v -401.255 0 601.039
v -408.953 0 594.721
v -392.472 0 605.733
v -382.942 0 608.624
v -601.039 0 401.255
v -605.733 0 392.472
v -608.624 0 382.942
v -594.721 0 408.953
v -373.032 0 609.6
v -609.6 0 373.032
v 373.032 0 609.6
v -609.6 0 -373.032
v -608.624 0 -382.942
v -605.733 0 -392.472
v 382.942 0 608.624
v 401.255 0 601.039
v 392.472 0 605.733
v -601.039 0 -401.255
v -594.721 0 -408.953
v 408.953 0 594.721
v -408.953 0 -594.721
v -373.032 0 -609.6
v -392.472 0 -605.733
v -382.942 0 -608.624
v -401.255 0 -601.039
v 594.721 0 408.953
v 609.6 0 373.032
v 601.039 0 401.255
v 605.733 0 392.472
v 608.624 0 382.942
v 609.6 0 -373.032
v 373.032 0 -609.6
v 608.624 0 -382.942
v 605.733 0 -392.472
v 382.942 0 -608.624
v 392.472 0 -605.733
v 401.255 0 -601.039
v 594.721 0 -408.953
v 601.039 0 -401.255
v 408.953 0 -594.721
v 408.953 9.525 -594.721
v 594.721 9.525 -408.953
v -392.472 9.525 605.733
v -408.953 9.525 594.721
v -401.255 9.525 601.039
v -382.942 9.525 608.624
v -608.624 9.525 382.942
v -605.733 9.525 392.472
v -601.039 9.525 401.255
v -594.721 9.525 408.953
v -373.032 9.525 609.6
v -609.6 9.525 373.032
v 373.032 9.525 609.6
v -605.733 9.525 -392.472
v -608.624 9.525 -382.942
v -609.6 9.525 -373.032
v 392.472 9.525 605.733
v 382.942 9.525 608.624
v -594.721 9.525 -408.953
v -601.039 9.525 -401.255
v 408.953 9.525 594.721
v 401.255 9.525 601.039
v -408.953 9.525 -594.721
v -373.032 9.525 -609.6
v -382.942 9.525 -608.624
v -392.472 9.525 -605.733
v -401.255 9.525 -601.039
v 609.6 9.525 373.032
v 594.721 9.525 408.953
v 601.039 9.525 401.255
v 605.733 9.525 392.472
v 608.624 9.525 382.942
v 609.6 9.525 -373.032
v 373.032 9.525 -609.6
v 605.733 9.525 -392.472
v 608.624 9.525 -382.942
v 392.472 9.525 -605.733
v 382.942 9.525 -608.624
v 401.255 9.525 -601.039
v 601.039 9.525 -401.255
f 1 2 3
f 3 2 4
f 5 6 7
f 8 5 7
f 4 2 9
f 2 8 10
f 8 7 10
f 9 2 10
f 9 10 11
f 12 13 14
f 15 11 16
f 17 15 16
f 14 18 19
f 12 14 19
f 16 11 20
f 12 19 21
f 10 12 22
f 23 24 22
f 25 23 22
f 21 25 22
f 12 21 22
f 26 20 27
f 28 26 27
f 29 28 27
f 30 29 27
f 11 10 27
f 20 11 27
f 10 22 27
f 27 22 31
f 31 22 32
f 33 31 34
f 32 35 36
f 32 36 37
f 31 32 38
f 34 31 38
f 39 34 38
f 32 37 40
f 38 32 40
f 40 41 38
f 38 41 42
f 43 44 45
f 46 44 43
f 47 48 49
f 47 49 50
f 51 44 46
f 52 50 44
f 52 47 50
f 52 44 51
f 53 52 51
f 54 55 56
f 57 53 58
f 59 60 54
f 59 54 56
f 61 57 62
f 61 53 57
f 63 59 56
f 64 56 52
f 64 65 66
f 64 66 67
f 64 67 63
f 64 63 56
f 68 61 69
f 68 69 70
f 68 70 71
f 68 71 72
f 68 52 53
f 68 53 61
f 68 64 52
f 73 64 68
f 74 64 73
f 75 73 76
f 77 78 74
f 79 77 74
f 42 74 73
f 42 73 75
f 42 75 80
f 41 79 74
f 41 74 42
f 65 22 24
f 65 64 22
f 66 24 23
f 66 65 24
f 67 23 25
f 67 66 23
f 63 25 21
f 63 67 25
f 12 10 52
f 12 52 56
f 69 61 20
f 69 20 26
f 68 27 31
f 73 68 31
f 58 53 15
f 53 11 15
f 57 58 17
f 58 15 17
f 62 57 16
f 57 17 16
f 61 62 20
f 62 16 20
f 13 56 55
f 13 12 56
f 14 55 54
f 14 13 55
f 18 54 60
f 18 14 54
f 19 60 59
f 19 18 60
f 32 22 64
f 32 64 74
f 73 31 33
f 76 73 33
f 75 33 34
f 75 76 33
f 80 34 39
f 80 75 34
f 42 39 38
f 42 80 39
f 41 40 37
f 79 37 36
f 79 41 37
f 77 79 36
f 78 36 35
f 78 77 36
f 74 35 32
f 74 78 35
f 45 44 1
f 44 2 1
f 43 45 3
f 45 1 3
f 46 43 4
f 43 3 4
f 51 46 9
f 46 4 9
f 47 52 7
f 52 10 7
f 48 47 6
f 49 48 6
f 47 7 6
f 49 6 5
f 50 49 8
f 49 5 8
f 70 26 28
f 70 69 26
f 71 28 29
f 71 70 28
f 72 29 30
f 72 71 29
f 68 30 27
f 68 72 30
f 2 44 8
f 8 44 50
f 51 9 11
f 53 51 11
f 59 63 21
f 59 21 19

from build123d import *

# Parameters (mm, degrees)
SKETCH1_W            = 1219.2
SKETCH1_H            = 1219.2
BOSS_EXTRUDE1_DEPTH  = 9.525
CUT_EXTRUDE1_REACH   = 864.157
SKETCH2_R            = 152.4
CUT_EXTRUDE2_DEPTH   = 863.157204705
MIRROR2_COPY_1_DEPTH = 863.157204705
FILLET1_R            = 50.8


with BuildPart() as part:
    # Sketch1 → Boss-Extrude1 (new body)
    with BuildSketch(Plane(origin=(0, 0, 0), x_dir=(1, 0, 0), z_dir=(0, 1, 0))):
        Rectangle(SKETCH1_W, SKETCH1_H)
    extrude(amount=BOSS_EXTRUDE1_DEPTH)

    # Sketch2 → Cut-Extrude1 (cut, up to next)
    with BuildSketch(Plane(origin=(0, 9.525, 0), x_dir=(1, 0, 0), z_dir=(0, 1, 0)), mode=Mode.PRIVATE) as cut_extrude1_sk1:
        with Locations((-609.6, 609.6)):
            Circle(SKETCH2_R)
    cut_extrude1_tool1 = extrude(cut_extrude1_sk1.sketch, amount=-CUT_EXTRUDE1_REACH, mode=Mode.PRIVATE) & part.part
    # Sketch2 → Cut-Extrude1 (cut, up to next)
    with BuildSketch(Plane(origin=(0, 9.525, 0), x_dir=(1, 0, 0), z_dir=(0, 1, 0)), mode=Mode.PRIVATE) as cut_extrude1_sk2:
        with Locations((-609.6, -609.6)):
            Circle(SKETCH2_R)
    cut_extrude1_tool2 = extrude(cut_extrude1_sk2.sketch, amount=-CUT_EXTRUDE1_REACH, mode=Mode.PRIVATE) & part.part
    # Sketch2 → Cut-Extrude1 (cut, up to next)
    with BuildSketch(Plane(origin=(0, 9.525, 0), x_dir=(1, 0, 0), z_dir=(0, 1, 0)), mode=Mode.PRIVATE) as cut_extrude1_sk3:
        with Locations((609.6, -609.6)):
            Circle(SKETCH2_R)
    cut_extrude1_tool3 = extrude(cut_extrude1_sk3.sketch, amount=-CUT_EXTRUDE1_REACH, mode=Mode.PRIVATE) & part.part
    # Sketch2 → Cut-Extrude1 (cut, up to next)
    with BuildSketch(Plane(origin=(0, 9.525, 0), x_dir=(1, 0, 0), z_dir=(0, 1, 0)), mode=Mode.PRIVATE) as cut_extrude1_sk4:
        with Locations((609.6, 609.6)):
            Circle(SKETCH2_R)
    cut_extrude1_tool4 = extrude(cut_extrude1_sk4.sketch, amount=-CUT_EXTRUDE1_REACH, mode=Mode.PRIVATE) & part.part
    add(cut_extrude1_tool1.solids().sort_by_distance((-609.6, 9.525, -609.6))[0], mode=Mode.SUBTRACT)
    add(cut_extrude1_tool2.solids().sort_by_distance((-609.6, 9.525, 609.6))[0], mode=Mode.SUBTRACT)
    add(cut_extrude1_tool3.solids().sort_by_distance((609.6, 9.525, 609.6))[0], mode=Mode.SUBTRACT)
    add(cut_extrude1_tool4.solids().sort_by_distance((609.6, 9.525, -609.6))[0], mode=Mode.SUBTRACT)

    # Sketch3 → Cut-Extrude2 (cut, symmetric)
    with BuildSketch(Plane(origin=(0, 9.525, 0), x_dir=(1, 0, 0), z_dir=(0, 1, 0))):
        Polygon((-1846.295154261, 2849.969007356), (394.073853094, 609.6), (609.6, 394.073853094), (2849.969007356, -1846.295154261), (7330.707022067, 2634.44286045), (2634.44286045, 7330.707022067), align=None)
    cut_extrude2 = extrude(amount=CUT_EXTRUDE2_DEPTH, both=True, mode=Mode.SUBTRACT)

    # Mirror1: Cut-Extrude2 across plane
    add(cut_extrude2.mirror(Plane.XY), mode=Mode.SUBTRACT)

    # Mirror2: Cut-Extrude2 across plane
    add(cut_extrude2.mirror(Plane(origin=(0, 0, 0), x_dir=(0, 0, 1), z_dir=(1, 0, 0))), mode=Mode.SUBTRACT)

    # Mirror2 copy 1 sketch → Mirror2 copy 1 (cut, symmetric)
    with BuildSketch(Plane(origin=(0, 9.525, 0), x_dir=(-1, 0, 0), z_dir=(0, 1, 0))):
        Polygon((-1846.295154261, 2849.969007356), (394.073853094, 609.6), (609.6, 394.073853094), (2849.969007356, -1846.295154261), (7330.707022067, 2634.44286045), (2634.44286045, 7330.707022067), align=None)
    extrude(amount=MIRROR2_COPY_1_DEPTH, both=True, mode=Mode.SUBTRACT)

    # Fillet1
    fillet1_edges = [part.edges().sort_by_distance(p)[0] for p in [
        (-609.6, 4.7625, -394.073853094),
        (-394.073853094, 4.7625, -609.6),
        (-609.6, 4.7625, 394.073853094),
        (-394.073853094, 4.7625, 609.6),
        (609.6, 4.7625, -394.073853094),
        (394.073853094, 4.7625, -609.6),
        (609.6, 4.7625, 394.073853094),
        (394.073853094, 4.7625, 609.6),
    ]]
    fillet(fillet1_edges, radius=FILLET1_R)


solid = part.part
